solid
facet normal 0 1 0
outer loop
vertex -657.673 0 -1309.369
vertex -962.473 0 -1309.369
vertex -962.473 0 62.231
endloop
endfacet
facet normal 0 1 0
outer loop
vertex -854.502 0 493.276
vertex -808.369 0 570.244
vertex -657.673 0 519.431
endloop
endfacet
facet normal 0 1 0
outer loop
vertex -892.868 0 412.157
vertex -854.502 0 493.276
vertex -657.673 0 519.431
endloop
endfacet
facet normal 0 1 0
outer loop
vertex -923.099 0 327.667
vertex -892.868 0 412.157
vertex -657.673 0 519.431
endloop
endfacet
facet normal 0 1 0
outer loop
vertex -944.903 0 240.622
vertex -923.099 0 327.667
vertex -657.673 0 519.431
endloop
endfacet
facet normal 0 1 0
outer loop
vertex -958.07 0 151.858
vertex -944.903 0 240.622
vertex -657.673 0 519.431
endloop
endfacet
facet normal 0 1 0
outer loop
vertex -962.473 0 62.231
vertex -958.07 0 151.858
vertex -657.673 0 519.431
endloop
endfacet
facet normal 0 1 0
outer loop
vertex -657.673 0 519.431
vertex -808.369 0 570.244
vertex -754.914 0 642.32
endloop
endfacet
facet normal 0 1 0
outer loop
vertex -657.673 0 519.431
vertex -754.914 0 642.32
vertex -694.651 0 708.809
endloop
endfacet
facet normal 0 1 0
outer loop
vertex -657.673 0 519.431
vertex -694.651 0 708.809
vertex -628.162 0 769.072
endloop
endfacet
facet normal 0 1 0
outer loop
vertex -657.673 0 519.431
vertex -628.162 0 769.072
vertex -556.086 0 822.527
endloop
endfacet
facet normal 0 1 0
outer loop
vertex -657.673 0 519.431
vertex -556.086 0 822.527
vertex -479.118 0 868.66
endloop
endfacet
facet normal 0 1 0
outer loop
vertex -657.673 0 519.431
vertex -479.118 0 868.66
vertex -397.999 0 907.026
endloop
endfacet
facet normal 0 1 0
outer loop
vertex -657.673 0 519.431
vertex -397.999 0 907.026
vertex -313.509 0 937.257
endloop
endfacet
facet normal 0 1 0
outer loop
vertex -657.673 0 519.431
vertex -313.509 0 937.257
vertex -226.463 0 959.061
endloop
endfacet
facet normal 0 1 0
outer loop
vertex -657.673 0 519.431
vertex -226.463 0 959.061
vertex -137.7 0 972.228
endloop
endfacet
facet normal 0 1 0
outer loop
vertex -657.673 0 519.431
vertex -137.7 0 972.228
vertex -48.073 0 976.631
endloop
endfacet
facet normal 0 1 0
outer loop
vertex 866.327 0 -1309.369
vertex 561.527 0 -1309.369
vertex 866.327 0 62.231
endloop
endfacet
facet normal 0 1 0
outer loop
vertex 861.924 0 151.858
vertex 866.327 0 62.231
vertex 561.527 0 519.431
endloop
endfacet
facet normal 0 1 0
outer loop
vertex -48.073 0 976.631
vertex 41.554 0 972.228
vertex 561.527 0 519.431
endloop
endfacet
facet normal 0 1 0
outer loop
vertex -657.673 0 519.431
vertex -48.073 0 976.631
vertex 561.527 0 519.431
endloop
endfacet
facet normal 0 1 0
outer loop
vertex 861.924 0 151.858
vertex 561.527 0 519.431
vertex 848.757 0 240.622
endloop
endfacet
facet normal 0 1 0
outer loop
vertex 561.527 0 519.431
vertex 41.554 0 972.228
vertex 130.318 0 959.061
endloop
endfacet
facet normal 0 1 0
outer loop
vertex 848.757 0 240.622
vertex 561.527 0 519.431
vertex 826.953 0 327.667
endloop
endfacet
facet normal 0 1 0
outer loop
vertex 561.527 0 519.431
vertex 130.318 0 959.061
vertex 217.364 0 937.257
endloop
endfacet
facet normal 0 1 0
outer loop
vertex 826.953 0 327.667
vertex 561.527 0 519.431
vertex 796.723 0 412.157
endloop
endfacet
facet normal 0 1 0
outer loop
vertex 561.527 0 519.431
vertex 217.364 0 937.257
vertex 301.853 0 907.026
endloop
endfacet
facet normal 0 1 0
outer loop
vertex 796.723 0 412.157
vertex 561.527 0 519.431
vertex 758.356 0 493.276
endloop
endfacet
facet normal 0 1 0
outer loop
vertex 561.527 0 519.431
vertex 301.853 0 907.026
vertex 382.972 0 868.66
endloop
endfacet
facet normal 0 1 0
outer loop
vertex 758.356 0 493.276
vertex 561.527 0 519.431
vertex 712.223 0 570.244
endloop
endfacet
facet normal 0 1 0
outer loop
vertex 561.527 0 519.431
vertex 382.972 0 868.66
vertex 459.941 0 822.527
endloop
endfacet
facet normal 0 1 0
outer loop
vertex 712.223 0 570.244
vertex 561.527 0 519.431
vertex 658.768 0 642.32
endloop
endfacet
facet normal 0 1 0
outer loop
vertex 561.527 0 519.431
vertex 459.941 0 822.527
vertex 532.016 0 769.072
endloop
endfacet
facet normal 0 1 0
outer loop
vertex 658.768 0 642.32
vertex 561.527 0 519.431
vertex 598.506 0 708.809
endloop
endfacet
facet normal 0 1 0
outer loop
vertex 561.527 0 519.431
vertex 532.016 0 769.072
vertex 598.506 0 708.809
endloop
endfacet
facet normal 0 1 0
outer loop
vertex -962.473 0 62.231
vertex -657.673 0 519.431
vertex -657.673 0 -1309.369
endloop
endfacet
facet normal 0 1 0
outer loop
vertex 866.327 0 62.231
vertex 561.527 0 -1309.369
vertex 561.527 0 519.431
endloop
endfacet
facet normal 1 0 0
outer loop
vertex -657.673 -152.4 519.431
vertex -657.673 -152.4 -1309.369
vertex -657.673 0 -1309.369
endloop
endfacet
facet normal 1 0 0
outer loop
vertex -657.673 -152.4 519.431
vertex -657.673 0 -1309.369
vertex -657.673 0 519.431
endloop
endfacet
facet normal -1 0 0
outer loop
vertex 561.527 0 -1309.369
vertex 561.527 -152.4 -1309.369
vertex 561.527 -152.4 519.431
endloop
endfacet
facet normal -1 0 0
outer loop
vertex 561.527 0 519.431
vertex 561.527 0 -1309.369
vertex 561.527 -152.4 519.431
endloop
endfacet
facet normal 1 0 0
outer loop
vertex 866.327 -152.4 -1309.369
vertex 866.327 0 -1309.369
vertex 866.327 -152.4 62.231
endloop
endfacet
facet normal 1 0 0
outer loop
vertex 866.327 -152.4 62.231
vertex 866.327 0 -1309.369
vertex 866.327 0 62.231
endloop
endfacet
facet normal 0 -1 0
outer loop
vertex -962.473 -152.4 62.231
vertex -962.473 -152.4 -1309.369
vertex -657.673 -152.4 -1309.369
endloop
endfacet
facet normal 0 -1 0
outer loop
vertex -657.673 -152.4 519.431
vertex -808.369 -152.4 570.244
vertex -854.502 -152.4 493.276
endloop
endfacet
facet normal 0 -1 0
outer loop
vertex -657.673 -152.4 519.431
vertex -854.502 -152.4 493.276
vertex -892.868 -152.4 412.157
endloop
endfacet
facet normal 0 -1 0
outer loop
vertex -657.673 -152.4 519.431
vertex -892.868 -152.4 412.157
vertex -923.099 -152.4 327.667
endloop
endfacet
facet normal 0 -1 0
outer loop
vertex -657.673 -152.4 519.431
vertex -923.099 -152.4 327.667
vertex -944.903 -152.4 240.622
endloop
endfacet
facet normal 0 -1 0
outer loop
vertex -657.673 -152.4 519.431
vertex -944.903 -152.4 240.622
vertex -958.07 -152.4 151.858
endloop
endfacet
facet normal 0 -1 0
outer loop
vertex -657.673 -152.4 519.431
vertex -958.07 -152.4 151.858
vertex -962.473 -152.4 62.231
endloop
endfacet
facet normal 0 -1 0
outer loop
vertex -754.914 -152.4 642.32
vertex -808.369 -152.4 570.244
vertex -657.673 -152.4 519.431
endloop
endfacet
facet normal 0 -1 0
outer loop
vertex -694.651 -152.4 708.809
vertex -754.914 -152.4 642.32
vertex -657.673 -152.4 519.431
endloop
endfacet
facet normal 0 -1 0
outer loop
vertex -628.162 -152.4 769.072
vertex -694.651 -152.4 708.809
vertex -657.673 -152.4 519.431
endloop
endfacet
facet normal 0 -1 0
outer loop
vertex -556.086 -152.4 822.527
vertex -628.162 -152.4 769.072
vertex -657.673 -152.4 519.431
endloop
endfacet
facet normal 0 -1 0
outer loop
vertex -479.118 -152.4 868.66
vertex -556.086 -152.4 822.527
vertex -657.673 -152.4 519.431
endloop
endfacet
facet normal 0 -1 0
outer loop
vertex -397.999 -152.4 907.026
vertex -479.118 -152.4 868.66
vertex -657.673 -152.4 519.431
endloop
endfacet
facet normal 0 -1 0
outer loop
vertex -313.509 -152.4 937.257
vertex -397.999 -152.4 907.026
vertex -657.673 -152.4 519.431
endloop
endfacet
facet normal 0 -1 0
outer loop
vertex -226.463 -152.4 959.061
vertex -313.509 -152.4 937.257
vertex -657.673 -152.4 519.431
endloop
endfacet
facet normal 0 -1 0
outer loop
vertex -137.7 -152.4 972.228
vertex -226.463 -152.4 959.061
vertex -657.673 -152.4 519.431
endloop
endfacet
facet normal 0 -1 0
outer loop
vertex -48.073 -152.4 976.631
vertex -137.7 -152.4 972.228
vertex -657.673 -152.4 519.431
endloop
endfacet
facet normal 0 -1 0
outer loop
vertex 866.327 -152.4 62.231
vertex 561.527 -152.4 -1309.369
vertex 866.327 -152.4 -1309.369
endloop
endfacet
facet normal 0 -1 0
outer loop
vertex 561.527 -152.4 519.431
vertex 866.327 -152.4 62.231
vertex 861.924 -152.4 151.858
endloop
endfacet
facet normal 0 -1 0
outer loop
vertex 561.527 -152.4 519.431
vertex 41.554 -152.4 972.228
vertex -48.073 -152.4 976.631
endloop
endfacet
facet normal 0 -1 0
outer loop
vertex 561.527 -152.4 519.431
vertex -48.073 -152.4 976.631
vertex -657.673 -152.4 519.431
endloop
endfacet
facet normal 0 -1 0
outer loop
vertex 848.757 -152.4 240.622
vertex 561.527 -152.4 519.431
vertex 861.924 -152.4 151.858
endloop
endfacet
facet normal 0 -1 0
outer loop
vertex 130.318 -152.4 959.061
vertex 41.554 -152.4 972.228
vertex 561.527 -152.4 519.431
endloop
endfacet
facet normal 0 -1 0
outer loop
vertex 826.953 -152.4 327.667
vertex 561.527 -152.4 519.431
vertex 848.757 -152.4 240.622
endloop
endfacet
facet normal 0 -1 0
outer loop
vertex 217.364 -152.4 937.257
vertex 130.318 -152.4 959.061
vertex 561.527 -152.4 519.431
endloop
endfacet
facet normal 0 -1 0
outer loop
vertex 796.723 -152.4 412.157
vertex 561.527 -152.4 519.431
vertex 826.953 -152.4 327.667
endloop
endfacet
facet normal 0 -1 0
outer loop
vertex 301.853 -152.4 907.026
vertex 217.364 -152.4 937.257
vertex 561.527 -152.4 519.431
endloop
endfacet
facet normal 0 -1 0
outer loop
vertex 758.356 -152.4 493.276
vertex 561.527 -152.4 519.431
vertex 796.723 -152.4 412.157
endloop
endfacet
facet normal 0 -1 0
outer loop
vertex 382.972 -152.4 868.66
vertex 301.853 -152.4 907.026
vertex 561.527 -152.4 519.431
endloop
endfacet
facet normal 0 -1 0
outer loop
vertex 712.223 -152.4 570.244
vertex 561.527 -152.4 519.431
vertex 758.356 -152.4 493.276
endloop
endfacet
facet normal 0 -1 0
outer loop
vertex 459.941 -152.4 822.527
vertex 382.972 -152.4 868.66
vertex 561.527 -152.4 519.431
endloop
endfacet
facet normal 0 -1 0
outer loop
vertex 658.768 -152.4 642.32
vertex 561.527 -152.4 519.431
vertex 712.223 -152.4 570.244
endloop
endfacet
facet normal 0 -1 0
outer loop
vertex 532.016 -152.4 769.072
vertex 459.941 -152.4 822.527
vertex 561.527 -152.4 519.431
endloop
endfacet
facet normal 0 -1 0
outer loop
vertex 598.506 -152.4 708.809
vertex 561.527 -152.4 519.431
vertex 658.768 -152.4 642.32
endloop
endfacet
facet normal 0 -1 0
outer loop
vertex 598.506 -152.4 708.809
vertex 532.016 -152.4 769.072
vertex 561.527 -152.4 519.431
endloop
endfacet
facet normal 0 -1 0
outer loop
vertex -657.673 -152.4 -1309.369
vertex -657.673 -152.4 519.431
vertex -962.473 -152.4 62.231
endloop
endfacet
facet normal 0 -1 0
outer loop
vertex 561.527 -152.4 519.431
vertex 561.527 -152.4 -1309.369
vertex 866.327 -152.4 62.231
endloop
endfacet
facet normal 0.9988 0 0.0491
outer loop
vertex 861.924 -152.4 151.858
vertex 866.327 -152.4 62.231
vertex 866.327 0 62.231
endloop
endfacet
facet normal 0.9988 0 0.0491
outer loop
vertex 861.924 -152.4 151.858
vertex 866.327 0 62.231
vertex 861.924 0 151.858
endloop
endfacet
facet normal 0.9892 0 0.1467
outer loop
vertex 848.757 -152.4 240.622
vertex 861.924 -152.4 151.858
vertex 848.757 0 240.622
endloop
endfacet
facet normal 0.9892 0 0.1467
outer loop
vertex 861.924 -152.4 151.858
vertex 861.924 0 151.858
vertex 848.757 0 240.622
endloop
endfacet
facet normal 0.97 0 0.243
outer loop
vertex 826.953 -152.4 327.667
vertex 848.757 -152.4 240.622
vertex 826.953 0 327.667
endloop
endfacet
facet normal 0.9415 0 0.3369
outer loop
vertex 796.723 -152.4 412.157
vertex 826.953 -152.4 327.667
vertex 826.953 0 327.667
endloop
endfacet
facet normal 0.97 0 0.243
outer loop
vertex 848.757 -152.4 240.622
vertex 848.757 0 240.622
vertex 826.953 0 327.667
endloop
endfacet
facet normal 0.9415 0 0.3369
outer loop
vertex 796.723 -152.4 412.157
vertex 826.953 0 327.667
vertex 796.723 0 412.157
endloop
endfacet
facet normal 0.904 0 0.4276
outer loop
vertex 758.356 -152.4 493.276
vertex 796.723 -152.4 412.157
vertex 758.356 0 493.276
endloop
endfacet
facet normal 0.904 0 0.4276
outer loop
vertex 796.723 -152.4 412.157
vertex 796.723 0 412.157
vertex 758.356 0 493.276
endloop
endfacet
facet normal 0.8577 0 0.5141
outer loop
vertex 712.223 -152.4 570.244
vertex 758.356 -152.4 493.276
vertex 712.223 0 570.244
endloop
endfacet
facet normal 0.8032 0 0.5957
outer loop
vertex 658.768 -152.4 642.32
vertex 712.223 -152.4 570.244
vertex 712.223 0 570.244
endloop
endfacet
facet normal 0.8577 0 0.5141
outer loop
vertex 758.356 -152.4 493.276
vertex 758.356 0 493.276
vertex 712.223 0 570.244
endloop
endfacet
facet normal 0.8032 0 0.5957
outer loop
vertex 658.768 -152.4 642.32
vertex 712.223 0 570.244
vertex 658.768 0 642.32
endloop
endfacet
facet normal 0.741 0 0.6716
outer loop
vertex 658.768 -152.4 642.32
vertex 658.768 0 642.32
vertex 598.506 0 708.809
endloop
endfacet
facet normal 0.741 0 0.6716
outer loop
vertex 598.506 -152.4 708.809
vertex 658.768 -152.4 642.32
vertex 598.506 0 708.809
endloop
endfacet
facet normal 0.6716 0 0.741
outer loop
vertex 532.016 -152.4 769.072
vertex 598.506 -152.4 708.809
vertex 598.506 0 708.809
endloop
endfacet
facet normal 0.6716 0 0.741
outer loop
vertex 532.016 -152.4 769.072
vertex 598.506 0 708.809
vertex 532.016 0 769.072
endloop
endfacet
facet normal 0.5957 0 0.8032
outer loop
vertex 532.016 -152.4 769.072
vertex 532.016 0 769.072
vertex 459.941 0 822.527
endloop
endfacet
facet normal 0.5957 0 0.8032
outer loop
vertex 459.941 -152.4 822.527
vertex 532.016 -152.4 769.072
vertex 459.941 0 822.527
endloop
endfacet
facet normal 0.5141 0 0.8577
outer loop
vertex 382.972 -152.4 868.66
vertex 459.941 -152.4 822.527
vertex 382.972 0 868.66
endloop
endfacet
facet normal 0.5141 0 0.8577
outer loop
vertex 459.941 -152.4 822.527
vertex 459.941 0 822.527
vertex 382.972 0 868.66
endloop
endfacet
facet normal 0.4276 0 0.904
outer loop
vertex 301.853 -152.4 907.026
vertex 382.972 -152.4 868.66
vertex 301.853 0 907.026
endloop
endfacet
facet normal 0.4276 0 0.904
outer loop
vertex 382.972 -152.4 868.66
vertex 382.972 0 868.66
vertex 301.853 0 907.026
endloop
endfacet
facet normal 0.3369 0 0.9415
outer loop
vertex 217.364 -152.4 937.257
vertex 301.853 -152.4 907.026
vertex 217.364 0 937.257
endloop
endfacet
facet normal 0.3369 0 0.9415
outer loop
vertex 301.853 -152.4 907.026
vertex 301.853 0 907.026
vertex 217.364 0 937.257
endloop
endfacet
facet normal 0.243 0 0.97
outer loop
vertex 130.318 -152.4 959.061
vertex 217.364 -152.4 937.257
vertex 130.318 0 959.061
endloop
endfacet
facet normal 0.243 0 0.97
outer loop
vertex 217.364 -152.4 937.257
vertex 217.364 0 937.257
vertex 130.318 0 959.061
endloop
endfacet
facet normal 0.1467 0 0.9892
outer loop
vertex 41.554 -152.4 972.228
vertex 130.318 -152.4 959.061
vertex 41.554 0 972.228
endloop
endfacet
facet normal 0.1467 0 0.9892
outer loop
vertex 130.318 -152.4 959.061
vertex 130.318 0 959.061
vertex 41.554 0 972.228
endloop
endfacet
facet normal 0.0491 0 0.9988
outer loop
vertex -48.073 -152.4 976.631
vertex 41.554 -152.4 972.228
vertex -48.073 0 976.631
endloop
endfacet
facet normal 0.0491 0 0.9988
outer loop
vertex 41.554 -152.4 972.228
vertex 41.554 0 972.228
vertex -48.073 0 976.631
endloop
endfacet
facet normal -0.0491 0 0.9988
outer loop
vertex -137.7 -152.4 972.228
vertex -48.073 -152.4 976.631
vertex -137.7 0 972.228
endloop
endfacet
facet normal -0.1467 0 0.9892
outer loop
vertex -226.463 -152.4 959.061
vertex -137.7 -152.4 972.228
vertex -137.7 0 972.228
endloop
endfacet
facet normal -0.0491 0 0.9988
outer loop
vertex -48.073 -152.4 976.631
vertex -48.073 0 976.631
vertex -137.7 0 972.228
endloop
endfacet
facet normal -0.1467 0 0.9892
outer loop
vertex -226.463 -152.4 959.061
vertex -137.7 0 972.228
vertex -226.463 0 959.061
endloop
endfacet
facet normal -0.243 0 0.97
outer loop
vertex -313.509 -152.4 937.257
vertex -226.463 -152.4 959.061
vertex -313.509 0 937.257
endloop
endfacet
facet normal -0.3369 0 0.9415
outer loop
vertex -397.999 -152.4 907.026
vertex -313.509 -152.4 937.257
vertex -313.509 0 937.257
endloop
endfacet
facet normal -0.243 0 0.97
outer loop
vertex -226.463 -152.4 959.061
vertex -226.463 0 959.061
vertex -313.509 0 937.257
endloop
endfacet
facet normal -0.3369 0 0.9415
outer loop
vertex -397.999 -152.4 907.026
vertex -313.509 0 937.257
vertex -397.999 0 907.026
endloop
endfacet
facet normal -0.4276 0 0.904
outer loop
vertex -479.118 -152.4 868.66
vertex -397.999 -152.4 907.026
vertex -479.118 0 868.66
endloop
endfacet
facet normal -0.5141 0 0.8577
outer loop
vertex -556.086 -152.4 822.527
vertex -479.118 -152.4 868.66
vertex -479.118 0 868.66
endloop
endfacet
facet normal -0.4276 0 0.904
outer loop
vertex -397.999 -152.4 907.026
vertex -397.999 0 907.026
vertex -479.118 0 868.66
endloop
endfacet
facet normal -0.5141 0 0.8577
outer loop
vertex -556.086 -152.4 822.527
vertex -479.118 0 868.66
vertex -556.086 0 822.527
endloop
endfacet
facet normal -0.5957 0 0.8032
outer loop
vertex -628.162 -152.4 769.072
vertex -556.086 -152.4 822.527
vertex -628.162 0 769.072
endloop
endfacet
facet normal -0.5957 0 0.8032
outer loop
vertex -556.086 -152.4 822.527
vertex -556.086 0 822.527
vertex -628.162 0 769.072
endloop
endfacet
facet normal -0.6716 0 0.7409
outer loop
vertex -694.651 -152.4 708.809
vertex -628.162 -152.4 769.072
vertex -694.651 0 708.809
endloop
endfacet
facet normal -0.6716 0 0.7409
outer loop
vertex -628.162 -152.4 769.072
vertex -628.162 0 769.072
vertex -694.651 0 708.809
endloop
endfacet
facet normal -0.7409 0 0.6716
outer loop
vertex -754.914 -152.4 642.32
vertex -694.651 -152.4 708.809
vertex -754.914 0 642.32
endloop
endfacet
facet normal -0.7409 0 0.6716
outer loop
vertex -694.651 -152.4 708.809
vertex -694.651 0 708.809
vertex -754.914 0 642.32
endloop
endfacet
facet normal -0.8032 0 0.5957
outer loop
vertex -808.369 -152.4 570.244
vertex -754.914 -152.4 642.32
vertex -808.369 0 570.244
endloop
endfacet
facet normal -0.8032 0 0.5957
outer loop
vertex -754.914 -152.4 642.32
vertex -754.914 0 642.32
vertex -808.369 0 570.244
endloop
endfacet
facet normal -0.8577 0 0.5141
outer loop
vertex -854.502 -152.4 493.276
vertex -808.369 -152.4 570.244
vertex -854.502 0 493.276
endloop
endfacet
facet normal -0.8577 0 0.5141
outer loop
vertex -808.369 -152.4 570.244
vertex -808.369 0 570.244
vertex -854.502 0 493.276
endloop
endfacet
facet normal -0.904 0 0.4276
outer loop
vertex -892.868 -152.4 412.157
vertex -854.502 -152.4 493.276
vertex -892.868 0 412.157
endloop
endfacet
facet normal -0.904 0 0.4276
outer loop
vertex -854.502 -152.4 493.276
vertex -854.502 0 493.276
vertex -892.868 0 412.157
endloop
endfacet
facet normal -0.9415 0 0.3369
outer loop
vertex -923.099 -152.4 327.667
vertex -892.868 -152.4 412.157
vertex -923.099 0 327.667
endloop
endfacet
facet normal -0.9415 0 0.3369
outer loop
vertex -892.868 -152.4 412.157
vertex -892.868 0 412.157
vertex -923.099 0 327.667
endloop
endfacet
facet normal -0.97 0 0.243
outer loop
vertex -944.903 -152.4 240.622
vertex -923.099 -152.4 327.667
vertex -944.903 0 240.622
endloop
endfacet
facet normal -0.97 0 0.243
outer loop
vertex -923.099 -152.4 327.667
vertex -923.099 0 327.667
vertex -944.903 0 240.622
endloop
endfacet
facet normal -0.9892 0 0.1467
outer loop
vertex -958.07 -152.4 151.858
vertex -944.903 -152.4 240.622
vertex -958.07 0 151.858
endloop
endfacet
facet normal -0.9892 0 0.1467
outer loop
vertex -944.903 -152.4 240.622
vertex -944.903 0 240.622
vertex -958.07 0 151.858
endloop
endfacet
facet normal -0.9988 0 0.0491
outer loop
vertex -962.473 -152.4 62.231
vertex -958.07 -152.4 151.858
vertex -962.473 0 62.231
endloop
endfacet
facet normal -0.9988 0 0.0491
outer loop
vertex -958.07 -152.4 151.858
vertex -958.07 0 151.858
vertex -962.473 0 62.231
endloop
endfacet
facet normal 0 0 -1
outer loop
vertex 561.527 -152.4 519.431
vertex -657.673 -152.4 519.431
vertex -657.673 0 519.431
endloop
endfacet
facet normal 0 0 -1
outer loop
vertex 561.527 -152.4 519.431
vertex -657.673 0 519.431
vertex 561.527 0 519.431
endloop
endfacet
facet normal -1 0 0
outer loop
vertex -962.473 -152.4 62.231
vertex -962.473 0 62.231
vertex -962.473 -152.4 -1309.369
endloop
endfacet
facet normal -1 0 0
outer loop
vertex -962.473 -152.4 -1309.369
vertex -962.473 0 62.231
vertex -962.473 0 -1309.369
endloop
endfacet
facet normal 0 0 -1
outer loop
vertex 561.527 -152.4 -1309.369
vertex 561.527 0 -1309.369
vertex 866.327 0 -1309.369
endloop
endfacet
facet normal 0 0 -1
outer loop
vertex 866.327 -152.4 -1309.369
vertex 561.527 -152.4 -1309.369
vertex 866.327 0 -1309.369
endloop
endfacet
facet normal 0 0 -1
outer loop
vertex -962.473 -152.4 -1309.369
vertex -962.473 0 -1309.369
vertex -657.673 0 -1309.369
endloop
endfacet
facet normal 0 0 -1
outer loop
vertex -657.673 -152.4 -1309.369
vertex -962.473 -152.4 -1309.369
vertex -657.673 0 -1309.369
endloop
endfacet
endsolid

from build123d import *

# Parameters (mm, degrees)
F1_DEPTH = 152.4
F2_W     = 1219.2
F2_H     = 1828.8
F3_DEPTH = 25.4
F4_DEPTH = 152.401


with BuildPart() as f1:
    # F0 (on Front) → F1 (new body)
    with BuildSketch(Plane.XZ):
        with BuildLine():
            Line((-962.472789, 62.231022), (-962.472789, -1309.368978))
            Line((-962.472789, -1309.368978), (866.327211, -1309.368978))
            Line((866.327211, -1309.368978), (866.327211, 62.231022))
            ThreePointArc((866.327211, 62.231022), (-48.072789, 976.631022), (-962.472789, 62.231022))
        make_face()
    extrude(amount=F1_DEPTH)

    # F2 (on face) → F3 (cut)
    with BuildSketch(Plane.XZ.offset(152.4)):
        with Locations((-48.072789, -394.968978)):
            Rectangle(F2_W, F2_H)
    extrude(amount=-F3_DEPTH, mode=Mode.SUBTRACT)

    # F2 (on face) → F4 (cut, through all)
    with BuildSketch(Plane.XZ.offset(152.4)):
        with Locations((-48.072789, -394.968978)):
            Rectangle(F2_W, F2_H)
    extrude(amount=-F4_DEPTH, mode=Mode.SUBTRACT)


solid = f1.part
